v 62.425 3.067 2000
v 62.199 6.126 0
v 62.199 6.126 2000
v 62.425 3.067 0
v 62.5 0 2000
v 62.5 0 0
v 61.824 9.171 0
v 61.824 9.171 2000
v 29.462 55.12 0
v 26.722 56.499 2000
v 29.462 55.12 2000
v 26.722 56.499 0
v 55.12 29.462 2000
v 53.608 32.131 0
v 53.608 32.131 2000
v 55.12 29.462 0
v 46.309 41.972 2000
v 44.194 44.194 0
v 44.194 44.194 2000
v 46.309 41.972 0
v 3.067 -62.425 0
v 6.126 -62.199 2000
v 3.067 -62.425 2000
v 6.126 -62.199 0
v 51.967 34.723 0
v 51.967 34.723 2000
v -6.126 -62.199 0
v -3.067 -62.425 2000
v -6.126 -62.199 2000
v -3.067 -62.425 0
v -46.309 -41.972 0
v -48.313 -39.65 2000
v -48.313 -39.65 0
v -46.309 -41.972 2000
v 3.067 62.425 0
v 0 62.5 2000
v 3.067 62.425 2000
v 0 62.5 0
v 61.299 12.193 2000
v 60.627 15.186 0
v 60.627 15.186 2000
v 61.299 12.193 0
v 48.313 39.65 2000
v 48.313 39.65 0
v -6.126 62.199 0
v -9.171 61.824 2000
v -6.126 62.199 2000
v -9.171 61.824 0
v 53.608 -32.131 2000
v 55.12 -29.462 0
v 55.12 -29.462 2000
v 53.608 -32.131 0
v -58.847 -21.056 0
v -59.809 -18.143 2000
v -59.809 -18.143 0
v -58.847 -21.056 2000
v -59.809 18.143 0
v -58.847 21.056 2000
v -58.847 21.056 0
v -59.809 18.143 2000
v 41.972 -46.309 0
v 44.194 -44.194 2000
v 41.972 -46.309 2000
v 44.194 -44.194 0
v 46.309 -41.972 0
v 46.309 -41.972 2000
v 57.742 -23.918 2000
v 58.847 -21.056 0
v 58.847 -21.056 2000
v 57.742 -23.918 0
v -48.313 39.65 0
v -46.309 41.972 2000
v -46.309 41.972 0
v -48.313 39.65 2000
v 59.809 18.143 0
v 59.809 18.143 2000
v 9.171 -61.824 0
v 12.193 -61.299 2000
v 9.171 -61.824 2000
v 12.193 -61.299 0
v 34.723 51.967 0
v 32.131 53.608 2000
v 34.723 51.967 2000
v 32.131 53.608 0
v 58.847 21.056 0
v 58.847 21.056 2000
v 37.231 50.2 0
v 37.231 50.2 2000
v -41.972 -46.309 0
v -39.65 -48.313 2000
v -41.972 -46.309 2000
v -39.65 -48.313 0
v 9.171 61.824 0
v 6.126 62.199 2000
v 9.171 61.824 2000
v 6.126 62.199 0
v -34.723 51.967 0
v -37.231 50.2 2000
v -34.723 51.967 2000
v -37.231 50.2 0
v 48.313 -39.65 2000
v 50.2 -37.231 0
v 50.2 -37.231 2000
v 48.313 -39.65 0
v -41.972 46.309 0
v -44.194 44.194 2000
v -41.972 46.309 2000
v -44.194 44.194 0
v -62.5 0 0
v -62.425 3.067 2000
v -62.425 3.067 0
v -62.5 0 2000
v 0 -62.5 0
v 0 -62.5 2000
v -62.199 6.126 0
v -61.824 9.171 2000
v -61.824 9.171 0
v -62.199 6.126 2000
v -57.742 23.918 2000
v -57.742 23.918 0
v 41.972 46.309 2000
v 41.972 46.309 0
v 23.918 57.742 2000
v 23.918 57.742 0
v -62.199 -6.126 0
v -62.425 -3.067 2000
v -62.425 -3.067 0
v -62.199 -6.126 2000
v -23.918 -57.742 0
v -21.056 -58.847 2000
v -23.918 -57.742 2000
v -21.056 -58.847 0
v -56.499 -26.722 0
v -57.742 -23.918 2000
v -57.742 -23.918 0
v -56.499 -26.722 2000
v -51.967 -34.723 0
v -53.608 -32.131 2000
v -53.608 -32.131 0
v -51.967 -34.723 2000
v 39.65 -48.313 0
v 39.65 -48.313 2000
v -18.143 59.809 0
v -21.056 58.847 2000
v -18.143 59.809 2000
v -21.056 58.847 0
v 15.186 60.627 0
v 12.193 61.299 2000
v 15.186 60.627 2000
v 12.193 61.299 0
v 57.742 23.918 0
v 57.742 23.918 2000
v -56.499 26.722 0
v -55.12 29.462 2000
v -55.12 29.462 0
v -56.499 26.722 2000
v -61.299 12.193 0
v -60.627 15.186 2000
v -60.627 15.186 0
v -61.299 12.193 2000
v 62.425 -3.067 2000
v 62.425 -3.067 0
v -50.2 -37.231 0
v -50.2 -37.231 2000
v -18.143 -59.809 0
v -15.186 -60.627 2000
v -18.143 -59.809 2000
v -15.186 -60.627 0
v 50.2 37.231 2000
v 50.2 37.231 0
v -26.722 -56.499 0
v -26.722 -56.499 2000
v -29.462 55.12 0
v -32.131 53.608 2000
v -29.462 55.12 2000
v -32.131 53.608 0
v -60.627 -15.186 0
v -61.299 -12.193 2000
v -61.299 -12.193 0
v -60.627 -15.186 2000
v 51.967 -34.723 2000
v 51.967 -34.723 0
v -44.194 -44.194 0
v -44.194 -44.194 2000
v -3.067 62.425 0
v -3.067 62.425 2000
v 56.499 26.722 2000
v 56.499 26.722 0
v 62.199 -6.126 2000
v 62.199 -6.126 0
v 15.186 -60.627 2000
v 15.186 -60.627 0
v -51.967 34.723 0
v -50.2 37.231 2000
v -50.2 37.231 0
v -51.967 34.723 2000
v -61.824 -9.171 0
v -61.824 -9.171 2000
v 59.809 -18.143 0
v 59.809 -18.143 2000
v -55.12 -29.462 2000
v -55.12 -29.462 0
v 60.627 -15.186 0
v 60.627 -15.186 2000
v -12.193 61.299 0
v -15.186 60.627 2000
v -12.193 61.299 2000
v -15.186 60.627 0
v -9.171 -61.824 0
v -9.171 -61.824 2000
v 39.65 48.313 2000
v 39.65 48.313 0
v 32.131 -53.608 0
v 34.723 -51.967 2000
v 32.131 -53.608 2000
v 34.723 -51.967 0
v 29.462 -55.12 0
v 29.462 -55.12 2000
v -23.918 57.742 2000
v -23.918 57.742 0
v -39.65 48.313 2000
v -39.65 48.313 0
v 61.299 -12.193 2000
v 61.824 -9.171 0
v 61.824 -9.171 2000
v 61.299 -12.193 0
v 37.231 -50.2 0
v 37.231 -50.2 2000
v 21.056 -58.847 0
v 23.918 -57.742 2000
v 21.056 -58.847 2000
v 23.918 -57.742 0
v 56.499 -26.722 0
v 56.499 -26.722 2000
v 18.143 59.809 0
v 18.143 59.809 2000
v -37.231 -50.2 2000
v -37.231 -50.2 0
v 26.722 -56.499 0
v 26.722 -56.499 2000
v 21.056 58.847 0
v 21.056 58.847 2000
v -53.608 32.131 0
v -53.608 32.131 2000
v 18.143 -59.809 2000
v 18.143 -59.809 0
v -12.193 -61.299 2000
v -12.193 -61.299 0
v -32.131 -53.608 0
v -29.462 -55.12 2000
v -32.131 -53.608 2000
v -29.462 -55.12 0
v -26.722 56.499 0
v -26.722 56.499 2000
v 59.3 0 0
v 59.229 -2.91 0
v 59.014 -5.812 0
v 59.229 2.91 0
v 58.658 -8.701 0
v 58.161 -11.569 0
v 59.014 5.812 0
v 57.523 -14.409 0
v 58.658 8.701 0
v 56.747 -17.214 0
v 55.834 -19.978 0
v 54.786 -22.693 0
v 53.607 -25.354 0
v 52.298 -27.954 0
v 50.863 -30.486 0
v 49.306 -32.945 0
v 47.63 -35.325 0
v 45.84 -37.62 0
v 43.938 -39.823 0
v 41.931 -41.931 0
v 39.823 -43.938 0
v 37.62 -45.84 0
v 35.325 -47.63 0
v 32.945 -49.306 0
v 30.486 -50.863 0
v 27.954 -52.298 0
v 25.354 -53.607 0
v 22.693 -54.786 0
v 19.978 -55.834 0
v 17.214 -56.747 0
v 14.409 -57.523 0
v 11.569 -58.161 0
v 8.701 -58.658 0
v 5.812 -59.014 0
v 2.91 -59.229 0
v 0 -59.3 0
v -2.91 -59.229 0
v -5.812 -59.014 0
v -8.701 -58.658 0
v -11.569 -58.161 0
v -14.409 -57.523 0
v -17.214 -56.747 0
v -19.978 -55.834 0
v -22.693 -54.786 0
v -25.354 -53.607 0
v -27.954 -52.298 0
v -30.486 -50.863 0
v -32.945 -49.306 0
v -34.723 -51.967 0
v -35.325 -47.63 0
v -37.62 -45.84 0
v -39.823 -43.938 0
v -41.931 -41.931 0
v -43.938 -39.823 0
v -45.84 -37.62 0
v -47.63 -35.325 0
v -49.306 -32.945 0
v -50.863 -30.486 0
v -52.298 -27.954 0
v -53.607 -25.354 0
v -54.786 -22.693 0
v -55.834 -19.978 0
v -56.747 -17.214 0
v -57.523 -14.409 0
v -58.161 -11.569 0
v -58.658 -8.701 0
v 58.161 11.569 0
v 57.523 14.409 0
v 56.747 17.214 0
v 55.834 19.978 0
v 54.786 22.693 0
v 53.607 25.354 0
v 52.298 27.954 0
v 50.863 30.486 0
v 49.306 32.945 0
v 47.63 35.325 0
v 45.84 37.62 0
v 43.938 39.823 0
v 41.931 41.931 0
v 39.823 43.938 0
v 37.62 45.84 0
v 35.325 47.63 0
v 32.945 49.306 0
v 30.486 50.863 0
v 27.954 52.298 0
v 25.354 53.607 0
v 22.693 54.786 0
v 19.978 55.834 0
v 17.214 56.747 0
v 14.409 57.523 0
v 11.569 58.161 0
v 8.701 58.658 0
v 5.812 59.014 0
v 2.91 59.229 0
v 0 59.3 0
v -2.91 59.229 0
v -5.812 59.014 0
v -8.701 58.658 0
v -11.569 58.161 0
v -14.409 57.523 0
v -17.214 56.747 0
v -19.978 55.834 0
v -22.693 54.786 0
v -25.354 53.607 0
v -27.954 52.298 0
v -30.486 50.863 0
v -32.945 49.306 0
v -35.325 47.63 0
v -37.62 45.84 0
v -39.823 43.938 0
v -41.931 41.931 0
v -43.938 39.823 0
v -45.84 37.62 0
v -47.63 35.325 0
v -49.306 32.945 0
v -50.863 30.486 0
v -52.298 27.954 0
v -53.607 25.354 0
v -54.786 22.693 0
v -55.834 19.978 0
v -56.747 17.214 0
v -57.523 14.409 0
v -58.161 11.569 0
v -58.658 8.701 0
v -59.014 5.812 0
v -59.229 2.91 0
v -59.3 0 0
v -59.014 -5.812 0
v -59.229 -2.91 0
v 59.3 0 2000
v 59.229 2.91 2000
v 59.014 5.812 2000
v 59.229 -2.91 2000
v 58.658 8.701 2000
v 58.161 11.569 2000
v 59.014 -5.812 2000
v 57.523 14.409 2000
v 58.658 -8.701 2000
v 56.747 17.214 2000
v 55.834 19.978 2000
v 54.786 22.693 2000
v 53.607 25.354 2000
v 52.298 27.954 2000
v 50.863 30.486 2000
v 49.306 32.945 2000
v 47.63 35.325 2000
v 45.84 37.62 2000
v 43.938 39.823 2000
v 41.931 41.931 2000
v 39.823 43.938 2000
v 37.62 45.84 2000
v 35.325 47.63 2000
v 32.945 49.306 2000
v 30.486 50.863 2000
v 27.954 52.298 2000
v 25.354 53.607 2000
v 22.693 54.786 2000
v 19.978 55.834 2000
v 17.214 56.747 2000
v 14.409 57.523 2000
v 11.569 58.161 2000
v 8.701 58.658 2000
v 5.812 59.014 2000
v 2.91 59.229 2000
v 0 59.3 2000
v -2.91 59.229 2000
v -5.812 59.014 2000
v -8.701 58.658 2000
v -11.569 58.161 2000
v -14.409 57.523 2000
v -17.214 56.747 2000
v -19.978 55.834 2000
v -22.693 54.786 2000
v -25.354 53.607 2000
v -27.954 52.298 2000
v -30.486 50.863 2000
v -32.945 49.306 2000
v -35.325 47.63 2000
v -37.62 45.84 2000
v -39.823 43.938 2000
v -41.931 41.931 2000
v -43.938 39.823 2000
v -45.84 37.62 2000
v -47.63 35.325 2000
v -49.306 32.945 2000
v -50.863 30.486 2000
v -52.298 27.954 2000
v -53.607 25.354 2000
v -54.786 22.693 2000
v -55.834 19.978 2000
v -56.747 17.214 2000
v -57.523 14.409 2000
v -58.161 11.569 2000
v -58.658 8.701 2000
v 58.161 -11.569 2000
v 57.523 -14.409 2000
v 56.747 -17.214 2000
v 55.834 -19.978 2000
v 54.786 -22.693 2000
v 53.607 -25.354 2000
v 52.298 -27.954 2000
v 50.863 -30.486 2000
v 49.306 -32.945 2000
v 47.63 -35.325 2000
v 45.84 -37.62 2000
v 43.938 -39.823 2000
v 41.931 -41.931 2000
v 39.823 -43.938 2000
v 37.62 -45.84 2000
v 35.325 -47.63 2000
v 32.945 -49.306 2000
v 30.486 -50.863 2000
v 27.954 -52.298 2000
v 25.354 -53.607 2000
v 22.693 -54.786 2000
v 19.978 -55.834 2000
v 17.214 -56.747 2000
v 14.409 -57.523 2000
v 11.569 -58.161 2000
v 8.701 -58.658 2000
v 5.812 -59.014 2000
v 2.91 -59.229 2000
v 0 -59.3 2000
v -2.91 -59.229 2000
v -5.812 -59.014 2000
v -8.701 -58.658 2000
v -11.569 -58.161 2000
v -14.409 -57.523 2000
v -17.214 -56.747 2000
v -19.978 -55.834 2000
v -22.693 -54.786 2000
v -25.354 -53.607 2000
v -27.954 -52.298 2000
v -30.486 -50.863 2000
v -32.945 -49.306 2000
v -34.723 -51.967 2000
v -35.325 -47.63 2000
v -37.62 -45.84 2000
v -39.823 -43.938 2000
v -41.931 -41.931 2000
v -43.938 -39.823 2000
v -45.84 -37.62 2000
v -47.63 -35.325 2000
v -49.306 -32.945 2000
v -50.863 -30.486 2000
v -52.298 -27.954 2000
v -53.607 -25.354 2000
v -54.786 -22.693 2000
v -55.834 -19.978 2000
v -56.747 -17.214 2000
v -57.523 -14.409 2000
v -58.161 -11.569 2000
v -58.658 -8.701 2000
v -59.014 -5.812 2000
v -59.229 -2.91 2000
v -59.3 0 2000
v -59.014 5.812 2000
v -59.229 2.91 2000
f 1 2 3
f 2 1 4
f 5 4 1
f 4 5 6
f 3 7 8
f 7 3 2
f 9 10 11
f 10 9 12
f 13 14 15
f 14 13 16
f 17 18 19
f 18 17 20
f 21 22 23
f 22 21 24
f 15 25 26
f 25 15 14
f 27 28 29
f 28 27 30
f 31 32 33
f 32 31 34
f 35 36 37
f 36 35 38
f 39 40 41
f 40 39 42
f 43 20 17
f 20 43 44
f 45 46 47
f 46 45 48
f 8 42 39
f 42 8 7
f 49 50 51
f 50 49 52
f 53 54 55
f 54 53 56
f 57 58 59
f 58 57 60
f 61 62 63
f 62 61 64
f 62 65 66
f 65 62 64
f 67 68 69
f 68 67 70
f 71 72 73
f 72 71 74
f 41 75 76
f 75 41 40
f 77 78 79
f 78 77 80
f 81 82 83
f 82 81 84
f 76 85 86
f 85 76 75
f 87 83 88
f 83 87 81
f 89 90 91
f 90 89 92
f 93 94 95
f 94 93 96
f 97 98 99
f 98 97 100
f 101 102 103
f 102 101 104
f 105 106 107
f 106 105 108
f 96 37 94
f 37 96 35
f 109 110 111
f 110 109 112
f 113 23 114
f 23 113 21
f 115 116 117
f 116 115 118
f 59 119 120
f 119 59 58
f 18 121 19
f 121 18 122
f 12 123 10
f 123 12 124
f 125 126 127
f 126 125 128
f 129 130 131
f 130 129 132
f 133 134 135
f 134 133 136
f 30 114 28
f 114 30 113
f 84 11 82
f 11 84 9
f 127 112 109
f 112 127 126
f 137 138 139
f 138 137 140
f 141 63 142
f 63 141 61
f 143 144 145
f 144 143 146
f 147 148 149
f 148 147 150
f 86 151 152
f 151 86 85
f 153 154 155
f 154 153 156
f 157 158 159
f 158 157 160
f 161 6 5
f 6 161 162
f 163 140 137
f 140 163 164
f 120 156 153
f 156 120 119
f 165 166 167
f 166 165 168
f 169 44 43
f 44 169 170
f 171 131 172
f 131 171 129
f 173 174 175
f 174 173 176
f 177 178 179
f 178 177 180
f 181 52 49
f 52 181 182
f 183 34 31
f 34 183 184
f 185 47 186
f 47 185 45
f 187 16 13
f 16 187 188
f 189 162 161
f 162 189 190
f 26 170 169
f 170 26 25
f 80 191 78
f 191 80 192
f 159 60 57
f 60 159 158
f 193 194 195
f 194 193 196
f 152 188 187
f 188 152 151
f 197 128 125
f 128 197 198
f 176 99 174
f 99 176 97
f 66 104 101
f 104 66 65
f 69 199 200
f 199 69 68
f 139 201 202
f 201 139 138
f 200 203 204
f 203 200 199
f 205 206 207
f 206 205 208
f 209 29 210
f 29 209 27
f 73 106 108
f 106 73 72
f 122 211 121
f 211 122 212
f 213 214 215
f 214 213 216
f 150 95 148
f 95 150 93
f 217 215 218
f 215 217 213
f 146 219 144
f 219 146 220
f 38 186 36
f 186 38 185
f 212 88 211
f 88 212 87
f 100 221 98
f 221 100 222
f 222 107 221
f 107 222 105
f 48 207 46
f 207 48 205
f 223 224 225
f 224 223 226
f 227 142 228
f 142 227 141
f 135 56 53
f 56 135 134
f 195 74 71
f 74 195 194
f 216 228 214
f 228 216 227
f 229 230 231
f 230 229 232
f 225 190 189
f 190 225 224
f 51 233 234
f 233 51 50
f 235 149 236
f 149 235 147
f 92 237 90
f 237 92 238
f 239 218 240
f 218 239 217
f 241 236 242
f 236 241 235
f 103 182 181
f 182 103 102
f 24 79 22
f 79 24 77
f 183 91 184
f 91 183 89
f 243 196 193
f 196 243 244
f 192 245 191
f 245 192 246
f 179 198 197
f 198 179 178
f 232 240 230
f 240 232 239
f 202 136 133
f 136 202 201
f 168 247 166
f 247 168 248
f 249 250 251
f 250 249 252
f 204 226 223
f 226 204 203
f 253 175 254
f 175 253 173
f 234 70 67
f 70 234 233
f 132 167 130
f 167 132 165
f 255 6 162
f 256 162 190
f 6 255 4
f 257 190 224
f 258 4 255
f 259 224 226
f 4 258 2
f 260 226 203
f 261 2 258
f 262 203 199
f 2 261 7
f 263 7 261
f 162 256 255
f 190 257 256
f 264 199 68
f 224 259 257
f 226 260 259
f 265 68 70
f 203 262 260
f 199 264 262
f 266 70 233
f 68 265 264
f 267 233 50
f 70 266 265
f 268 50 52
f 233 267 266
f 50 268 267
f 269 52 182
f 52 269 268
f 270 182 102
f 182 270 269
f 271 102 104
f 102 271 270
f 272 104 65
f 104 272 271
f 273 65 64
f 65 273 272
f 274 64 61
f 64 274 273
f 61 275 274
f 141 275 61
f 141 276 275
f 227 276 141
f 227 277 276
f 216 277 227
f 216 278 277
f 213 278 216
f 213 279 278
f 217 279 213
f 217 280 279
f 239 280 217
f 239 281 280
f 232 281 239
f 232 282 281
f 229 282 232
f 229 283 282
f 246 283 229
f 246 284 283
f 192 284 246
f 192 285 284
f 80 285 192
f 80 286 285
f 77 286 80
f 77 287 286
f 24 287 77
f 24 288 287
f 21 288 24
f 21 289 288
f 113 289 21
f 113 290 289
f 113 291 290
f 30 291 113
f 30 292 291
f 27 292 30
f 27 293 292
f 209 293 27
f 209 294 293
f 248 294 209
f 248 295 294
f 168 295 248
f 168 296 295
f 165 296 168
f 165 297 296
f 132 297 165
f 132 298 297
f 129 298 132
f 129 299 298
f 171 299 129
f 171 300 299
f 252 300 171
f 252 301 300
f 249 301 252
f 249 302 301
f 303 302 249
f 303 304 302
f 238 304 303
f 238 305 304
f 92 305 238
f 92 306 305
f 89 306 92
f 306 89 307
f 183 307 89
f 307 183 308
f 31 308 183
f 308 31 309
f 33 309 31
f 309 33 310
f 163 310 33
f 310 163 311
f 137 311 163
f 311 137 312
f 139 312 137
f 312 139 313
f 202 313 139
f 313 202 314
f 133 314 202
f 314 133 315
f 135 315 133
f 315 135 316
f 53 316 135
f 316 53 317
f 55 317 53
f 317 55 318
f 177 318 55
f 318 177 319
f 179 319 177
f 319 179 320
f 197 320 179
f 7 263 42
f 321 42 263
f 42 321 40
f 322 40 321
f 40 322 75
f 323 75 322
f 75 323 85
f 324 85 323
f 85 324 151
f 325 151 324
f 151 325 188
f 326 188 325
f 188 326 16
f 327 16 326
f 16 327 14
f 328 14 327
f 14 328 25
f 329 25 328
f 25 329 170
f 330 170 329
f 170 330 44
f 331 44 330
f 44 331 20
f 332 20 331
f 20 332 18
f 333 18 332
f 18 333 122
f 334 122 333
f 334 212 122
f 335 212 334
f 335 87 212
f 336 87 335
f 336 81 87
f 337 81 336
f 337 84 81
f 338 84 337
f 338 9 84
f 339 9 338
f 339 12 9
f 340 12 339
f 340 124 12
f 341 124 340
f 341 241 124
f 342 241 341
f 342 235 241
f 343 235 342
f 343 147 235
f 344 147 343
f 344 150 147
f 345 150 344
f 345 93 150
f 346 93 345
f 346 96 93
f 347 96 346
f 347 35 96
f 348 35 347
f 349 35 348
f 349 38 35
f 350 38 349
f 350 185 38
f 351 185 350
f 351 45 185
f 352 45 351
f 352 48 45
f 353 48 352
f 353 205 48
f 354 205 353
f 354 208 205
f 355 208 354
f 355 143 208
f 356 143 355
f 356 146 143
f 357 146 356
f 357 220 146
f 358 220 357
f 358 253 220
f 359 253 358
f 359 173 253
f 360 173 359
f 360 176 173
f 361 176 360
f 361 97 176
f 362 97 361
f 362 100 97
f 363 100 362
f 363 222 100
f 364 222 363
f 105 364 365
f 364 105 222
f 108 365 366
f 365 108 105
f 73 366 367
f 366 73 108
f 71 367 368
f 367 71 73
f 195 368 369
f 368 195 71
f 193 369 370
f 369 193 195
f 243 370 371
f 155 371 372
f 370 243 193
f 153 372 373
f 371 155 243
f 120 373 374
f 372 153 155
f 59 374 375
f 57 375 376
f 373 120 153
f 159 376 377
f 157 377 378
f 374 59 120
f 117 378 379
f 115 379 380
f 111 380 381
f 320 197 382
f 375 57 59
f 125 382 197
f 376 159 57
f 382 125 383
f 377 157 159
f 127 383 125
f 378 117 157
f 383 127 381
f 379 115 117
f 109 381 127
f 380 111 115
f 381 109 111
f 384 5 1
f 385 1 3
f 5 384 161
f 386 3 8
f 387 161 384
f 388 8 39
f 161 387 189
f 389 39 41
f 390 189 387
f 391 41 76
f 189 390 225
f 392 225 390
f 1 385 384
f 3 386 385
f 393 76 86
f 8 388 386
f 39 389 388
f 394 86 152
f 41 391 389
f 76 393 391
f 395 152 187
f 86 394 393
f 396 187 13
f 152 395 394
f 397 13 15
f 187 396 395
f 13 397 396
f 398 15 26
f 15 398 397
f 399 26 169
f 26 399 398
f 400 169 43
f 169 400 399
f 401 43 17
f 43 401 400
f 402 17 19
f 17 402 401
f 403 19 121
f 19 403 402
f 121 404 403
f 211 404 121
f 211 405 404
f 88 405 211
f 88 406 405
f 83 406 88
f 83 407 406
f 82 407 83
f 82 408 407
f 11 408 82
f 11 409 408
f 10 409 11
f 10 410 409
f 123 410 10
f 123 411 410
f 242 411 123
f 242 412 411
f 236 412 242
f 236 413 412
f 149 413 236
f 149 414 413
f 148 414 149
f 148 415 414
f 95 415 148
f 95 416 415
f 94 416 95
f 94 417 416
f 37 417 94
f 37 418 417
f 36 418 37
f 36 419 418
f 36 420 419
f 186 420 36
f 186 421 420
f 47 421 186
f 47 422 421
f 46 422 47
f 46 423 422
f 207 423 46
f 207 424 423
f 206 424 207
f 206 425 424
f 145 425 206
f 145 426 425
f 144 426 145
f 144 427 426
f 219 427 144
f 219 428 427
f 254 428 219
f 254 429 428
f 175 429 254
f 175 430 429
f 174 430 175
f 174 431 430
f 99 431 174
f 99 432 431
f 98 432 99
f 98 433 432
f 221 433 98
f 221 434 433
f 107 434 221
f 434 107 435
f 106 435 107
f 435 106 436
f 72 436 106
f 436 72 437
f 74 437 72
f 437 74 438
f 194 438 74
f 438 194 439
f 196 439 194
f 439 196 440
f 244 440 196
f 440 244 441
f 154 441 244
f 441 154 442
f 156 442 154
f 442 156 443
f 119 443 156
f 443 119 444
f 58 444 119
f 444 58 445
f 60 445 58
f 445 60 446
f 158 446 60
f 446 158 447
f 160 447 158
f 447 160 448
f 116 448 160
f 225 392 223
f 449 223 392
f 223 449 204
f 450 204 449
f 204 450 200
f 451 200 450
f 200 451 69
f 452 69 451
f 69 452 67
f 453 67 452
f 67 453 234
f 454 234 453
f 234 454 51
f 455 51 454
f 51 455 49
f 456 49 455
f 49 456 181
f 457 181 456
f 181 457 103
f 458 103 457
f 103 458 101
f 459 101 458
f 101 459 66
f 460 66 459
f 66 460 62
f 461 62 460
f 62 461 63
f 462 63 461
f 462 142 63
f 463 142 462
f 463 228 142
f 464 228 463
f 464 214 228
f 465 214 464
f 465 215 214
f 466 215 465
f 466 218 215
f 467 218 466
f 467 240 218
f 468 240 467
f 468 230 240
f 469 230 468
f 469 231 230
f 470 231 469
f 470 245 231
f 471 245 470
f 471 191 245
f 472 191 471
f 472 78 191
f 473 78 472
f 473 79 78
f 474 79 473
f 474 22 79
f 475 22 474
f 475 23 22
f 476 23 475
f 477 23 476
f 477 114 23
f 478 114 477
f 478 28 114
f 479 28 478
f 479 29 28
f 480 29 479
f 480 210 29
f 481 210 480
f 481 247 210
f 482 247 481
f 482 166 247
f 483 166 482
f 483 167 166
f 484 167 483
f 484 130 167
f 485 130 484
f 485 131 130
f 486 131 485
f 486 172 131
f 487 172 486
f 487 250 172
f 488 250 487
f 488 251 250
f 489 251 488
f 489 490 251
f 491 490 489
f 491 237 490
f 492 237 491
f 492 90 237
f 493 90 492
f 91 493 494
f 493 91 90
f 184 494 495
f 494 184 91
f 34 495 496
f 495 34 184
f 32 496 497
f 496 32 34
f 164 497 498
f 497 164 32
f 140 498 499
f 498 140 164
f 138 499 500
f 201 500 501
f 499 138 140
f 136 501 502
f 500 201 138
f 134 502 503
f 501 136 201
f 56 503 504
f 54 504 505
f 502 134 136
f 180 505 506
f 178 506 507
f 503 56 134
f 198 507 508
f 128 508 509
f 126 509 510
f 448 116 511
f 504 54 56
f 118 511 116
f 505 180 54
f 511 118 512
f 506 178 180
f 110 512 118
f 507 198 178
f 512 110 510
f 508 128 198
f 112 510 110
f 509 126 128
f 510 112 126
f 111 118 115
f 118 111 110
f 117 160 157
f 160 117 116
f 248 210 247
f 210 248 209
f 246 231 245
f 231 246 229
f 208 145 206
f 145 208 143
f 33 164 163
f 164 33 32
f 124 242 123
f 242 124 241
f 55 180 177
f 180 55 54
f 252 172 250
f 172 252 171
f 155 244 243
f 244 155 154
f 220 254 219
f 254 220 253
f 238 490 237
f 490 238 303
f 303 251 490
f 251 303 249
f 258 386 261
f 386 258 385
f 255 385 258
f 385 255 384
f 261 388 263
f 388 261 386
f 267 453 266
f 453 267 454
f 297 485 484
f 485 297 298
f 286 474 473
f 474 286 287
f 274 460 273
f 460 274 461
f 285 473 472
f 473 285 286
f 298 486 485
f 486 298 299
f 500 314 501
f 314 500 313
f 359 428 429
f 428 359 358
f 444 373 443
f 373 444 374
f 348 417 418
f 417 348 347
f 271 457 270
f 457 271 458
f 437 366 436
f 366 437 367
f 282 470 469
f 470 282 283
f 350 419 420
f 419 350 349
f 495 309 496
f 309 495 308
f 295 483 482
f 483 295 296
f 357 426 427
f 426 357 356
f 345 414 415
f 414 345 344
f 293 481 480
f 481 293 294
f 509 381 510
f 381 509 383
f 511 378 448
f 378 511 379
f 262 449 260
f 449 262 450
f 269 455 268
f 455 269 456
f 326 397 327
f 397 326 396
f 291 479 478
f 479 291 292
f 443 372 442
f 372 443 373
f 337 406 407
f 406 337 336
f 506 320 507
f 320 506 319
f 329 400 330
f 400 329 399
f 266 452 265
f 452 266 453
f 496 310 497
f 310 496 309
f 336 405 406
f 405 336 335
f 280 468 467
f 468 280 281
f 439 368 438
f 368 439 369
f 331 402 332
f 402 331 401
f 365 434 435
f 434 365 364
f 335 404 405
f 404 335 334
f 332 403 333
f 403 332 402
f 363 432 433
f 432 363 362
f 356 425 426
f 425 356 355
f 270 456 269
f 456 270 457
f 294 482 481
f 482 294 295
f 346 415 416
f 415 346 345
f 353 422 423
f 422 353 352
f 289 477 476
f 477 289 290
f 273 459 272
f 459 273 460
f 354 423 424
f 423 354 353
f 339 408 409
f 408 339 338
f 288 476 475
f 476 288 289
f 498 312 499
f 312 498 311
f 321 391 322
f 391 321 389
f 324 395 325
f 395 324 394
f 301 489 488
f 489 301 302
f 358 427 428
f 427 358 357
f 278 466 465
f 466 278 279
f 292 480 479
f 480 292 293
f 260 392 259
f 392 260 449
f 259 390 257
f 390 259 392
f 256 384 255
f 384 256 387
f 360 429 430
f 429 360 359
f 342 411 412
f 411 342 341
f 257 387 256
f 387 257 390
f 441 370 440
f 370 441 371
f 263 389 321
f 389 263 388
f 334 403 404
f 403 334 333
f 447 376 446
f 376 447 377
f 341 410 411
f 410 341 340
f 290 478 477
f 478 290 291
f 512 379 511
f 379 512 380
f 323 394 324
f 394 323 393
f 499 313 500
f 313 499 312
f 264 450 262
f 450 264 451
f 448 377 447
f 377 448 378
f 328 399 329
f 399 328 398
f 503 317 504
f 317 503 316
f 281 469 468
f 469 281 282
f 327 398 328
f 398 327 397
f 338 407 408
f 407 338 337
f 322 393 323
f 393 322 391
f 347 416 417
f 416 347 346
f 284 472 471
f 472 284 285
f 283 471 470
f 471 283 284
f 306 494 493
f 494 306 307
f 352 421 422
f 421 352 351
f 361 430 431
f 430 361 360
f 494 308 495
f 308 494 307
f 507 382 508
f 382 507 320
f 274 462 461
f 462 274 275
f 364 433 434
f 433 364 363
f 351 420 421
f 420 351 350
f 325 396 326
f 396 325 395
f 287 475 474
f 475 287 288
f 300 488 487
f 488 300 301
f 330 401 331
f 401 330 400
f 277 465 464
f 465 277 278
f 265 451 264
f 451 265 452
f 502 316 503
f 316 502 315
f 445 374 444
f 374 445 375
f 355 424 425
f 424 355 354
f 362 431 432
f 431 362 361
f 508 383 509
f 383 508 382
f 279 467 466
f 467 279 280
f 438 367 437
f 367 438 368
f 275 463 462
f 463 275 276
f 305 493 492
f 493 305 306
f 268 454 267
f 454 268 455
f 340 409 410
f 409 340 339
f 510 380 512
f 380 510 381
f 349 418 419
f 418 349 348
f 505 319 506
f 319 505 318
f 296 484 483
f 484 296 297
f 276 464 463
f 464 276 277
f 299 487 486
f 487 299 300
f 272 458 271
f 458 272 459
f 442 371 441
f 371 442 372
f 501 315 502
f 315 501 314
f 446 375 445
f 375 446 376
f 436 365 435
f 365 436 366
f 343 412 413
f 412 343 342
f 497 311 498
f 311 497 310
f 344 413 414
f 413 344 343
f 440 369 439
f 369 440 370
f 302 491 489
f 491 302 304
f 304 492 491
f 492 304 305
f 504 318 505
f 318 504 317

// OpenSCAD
$fn = 128;

// HT pipe parameters (mm)
pipe_dn = 125;          // nominal diameter label
pipe_length = 2000;     // length
outer_d = 125;          // assumed outer diameter for "HT 125"
wall = 3.2;             // typical HT wall thickness (approx)
inner_d = outer_d - 2*wall;

module ht_pipe(od, id, L) {
    difference() {
        cylinder(h = L, d = od);
        translate([0,0,-0.5])
            cylinder(h = L + 1, d = id);
    }
}

ht_pipe(outer_d, inner_d, pipe_length);
